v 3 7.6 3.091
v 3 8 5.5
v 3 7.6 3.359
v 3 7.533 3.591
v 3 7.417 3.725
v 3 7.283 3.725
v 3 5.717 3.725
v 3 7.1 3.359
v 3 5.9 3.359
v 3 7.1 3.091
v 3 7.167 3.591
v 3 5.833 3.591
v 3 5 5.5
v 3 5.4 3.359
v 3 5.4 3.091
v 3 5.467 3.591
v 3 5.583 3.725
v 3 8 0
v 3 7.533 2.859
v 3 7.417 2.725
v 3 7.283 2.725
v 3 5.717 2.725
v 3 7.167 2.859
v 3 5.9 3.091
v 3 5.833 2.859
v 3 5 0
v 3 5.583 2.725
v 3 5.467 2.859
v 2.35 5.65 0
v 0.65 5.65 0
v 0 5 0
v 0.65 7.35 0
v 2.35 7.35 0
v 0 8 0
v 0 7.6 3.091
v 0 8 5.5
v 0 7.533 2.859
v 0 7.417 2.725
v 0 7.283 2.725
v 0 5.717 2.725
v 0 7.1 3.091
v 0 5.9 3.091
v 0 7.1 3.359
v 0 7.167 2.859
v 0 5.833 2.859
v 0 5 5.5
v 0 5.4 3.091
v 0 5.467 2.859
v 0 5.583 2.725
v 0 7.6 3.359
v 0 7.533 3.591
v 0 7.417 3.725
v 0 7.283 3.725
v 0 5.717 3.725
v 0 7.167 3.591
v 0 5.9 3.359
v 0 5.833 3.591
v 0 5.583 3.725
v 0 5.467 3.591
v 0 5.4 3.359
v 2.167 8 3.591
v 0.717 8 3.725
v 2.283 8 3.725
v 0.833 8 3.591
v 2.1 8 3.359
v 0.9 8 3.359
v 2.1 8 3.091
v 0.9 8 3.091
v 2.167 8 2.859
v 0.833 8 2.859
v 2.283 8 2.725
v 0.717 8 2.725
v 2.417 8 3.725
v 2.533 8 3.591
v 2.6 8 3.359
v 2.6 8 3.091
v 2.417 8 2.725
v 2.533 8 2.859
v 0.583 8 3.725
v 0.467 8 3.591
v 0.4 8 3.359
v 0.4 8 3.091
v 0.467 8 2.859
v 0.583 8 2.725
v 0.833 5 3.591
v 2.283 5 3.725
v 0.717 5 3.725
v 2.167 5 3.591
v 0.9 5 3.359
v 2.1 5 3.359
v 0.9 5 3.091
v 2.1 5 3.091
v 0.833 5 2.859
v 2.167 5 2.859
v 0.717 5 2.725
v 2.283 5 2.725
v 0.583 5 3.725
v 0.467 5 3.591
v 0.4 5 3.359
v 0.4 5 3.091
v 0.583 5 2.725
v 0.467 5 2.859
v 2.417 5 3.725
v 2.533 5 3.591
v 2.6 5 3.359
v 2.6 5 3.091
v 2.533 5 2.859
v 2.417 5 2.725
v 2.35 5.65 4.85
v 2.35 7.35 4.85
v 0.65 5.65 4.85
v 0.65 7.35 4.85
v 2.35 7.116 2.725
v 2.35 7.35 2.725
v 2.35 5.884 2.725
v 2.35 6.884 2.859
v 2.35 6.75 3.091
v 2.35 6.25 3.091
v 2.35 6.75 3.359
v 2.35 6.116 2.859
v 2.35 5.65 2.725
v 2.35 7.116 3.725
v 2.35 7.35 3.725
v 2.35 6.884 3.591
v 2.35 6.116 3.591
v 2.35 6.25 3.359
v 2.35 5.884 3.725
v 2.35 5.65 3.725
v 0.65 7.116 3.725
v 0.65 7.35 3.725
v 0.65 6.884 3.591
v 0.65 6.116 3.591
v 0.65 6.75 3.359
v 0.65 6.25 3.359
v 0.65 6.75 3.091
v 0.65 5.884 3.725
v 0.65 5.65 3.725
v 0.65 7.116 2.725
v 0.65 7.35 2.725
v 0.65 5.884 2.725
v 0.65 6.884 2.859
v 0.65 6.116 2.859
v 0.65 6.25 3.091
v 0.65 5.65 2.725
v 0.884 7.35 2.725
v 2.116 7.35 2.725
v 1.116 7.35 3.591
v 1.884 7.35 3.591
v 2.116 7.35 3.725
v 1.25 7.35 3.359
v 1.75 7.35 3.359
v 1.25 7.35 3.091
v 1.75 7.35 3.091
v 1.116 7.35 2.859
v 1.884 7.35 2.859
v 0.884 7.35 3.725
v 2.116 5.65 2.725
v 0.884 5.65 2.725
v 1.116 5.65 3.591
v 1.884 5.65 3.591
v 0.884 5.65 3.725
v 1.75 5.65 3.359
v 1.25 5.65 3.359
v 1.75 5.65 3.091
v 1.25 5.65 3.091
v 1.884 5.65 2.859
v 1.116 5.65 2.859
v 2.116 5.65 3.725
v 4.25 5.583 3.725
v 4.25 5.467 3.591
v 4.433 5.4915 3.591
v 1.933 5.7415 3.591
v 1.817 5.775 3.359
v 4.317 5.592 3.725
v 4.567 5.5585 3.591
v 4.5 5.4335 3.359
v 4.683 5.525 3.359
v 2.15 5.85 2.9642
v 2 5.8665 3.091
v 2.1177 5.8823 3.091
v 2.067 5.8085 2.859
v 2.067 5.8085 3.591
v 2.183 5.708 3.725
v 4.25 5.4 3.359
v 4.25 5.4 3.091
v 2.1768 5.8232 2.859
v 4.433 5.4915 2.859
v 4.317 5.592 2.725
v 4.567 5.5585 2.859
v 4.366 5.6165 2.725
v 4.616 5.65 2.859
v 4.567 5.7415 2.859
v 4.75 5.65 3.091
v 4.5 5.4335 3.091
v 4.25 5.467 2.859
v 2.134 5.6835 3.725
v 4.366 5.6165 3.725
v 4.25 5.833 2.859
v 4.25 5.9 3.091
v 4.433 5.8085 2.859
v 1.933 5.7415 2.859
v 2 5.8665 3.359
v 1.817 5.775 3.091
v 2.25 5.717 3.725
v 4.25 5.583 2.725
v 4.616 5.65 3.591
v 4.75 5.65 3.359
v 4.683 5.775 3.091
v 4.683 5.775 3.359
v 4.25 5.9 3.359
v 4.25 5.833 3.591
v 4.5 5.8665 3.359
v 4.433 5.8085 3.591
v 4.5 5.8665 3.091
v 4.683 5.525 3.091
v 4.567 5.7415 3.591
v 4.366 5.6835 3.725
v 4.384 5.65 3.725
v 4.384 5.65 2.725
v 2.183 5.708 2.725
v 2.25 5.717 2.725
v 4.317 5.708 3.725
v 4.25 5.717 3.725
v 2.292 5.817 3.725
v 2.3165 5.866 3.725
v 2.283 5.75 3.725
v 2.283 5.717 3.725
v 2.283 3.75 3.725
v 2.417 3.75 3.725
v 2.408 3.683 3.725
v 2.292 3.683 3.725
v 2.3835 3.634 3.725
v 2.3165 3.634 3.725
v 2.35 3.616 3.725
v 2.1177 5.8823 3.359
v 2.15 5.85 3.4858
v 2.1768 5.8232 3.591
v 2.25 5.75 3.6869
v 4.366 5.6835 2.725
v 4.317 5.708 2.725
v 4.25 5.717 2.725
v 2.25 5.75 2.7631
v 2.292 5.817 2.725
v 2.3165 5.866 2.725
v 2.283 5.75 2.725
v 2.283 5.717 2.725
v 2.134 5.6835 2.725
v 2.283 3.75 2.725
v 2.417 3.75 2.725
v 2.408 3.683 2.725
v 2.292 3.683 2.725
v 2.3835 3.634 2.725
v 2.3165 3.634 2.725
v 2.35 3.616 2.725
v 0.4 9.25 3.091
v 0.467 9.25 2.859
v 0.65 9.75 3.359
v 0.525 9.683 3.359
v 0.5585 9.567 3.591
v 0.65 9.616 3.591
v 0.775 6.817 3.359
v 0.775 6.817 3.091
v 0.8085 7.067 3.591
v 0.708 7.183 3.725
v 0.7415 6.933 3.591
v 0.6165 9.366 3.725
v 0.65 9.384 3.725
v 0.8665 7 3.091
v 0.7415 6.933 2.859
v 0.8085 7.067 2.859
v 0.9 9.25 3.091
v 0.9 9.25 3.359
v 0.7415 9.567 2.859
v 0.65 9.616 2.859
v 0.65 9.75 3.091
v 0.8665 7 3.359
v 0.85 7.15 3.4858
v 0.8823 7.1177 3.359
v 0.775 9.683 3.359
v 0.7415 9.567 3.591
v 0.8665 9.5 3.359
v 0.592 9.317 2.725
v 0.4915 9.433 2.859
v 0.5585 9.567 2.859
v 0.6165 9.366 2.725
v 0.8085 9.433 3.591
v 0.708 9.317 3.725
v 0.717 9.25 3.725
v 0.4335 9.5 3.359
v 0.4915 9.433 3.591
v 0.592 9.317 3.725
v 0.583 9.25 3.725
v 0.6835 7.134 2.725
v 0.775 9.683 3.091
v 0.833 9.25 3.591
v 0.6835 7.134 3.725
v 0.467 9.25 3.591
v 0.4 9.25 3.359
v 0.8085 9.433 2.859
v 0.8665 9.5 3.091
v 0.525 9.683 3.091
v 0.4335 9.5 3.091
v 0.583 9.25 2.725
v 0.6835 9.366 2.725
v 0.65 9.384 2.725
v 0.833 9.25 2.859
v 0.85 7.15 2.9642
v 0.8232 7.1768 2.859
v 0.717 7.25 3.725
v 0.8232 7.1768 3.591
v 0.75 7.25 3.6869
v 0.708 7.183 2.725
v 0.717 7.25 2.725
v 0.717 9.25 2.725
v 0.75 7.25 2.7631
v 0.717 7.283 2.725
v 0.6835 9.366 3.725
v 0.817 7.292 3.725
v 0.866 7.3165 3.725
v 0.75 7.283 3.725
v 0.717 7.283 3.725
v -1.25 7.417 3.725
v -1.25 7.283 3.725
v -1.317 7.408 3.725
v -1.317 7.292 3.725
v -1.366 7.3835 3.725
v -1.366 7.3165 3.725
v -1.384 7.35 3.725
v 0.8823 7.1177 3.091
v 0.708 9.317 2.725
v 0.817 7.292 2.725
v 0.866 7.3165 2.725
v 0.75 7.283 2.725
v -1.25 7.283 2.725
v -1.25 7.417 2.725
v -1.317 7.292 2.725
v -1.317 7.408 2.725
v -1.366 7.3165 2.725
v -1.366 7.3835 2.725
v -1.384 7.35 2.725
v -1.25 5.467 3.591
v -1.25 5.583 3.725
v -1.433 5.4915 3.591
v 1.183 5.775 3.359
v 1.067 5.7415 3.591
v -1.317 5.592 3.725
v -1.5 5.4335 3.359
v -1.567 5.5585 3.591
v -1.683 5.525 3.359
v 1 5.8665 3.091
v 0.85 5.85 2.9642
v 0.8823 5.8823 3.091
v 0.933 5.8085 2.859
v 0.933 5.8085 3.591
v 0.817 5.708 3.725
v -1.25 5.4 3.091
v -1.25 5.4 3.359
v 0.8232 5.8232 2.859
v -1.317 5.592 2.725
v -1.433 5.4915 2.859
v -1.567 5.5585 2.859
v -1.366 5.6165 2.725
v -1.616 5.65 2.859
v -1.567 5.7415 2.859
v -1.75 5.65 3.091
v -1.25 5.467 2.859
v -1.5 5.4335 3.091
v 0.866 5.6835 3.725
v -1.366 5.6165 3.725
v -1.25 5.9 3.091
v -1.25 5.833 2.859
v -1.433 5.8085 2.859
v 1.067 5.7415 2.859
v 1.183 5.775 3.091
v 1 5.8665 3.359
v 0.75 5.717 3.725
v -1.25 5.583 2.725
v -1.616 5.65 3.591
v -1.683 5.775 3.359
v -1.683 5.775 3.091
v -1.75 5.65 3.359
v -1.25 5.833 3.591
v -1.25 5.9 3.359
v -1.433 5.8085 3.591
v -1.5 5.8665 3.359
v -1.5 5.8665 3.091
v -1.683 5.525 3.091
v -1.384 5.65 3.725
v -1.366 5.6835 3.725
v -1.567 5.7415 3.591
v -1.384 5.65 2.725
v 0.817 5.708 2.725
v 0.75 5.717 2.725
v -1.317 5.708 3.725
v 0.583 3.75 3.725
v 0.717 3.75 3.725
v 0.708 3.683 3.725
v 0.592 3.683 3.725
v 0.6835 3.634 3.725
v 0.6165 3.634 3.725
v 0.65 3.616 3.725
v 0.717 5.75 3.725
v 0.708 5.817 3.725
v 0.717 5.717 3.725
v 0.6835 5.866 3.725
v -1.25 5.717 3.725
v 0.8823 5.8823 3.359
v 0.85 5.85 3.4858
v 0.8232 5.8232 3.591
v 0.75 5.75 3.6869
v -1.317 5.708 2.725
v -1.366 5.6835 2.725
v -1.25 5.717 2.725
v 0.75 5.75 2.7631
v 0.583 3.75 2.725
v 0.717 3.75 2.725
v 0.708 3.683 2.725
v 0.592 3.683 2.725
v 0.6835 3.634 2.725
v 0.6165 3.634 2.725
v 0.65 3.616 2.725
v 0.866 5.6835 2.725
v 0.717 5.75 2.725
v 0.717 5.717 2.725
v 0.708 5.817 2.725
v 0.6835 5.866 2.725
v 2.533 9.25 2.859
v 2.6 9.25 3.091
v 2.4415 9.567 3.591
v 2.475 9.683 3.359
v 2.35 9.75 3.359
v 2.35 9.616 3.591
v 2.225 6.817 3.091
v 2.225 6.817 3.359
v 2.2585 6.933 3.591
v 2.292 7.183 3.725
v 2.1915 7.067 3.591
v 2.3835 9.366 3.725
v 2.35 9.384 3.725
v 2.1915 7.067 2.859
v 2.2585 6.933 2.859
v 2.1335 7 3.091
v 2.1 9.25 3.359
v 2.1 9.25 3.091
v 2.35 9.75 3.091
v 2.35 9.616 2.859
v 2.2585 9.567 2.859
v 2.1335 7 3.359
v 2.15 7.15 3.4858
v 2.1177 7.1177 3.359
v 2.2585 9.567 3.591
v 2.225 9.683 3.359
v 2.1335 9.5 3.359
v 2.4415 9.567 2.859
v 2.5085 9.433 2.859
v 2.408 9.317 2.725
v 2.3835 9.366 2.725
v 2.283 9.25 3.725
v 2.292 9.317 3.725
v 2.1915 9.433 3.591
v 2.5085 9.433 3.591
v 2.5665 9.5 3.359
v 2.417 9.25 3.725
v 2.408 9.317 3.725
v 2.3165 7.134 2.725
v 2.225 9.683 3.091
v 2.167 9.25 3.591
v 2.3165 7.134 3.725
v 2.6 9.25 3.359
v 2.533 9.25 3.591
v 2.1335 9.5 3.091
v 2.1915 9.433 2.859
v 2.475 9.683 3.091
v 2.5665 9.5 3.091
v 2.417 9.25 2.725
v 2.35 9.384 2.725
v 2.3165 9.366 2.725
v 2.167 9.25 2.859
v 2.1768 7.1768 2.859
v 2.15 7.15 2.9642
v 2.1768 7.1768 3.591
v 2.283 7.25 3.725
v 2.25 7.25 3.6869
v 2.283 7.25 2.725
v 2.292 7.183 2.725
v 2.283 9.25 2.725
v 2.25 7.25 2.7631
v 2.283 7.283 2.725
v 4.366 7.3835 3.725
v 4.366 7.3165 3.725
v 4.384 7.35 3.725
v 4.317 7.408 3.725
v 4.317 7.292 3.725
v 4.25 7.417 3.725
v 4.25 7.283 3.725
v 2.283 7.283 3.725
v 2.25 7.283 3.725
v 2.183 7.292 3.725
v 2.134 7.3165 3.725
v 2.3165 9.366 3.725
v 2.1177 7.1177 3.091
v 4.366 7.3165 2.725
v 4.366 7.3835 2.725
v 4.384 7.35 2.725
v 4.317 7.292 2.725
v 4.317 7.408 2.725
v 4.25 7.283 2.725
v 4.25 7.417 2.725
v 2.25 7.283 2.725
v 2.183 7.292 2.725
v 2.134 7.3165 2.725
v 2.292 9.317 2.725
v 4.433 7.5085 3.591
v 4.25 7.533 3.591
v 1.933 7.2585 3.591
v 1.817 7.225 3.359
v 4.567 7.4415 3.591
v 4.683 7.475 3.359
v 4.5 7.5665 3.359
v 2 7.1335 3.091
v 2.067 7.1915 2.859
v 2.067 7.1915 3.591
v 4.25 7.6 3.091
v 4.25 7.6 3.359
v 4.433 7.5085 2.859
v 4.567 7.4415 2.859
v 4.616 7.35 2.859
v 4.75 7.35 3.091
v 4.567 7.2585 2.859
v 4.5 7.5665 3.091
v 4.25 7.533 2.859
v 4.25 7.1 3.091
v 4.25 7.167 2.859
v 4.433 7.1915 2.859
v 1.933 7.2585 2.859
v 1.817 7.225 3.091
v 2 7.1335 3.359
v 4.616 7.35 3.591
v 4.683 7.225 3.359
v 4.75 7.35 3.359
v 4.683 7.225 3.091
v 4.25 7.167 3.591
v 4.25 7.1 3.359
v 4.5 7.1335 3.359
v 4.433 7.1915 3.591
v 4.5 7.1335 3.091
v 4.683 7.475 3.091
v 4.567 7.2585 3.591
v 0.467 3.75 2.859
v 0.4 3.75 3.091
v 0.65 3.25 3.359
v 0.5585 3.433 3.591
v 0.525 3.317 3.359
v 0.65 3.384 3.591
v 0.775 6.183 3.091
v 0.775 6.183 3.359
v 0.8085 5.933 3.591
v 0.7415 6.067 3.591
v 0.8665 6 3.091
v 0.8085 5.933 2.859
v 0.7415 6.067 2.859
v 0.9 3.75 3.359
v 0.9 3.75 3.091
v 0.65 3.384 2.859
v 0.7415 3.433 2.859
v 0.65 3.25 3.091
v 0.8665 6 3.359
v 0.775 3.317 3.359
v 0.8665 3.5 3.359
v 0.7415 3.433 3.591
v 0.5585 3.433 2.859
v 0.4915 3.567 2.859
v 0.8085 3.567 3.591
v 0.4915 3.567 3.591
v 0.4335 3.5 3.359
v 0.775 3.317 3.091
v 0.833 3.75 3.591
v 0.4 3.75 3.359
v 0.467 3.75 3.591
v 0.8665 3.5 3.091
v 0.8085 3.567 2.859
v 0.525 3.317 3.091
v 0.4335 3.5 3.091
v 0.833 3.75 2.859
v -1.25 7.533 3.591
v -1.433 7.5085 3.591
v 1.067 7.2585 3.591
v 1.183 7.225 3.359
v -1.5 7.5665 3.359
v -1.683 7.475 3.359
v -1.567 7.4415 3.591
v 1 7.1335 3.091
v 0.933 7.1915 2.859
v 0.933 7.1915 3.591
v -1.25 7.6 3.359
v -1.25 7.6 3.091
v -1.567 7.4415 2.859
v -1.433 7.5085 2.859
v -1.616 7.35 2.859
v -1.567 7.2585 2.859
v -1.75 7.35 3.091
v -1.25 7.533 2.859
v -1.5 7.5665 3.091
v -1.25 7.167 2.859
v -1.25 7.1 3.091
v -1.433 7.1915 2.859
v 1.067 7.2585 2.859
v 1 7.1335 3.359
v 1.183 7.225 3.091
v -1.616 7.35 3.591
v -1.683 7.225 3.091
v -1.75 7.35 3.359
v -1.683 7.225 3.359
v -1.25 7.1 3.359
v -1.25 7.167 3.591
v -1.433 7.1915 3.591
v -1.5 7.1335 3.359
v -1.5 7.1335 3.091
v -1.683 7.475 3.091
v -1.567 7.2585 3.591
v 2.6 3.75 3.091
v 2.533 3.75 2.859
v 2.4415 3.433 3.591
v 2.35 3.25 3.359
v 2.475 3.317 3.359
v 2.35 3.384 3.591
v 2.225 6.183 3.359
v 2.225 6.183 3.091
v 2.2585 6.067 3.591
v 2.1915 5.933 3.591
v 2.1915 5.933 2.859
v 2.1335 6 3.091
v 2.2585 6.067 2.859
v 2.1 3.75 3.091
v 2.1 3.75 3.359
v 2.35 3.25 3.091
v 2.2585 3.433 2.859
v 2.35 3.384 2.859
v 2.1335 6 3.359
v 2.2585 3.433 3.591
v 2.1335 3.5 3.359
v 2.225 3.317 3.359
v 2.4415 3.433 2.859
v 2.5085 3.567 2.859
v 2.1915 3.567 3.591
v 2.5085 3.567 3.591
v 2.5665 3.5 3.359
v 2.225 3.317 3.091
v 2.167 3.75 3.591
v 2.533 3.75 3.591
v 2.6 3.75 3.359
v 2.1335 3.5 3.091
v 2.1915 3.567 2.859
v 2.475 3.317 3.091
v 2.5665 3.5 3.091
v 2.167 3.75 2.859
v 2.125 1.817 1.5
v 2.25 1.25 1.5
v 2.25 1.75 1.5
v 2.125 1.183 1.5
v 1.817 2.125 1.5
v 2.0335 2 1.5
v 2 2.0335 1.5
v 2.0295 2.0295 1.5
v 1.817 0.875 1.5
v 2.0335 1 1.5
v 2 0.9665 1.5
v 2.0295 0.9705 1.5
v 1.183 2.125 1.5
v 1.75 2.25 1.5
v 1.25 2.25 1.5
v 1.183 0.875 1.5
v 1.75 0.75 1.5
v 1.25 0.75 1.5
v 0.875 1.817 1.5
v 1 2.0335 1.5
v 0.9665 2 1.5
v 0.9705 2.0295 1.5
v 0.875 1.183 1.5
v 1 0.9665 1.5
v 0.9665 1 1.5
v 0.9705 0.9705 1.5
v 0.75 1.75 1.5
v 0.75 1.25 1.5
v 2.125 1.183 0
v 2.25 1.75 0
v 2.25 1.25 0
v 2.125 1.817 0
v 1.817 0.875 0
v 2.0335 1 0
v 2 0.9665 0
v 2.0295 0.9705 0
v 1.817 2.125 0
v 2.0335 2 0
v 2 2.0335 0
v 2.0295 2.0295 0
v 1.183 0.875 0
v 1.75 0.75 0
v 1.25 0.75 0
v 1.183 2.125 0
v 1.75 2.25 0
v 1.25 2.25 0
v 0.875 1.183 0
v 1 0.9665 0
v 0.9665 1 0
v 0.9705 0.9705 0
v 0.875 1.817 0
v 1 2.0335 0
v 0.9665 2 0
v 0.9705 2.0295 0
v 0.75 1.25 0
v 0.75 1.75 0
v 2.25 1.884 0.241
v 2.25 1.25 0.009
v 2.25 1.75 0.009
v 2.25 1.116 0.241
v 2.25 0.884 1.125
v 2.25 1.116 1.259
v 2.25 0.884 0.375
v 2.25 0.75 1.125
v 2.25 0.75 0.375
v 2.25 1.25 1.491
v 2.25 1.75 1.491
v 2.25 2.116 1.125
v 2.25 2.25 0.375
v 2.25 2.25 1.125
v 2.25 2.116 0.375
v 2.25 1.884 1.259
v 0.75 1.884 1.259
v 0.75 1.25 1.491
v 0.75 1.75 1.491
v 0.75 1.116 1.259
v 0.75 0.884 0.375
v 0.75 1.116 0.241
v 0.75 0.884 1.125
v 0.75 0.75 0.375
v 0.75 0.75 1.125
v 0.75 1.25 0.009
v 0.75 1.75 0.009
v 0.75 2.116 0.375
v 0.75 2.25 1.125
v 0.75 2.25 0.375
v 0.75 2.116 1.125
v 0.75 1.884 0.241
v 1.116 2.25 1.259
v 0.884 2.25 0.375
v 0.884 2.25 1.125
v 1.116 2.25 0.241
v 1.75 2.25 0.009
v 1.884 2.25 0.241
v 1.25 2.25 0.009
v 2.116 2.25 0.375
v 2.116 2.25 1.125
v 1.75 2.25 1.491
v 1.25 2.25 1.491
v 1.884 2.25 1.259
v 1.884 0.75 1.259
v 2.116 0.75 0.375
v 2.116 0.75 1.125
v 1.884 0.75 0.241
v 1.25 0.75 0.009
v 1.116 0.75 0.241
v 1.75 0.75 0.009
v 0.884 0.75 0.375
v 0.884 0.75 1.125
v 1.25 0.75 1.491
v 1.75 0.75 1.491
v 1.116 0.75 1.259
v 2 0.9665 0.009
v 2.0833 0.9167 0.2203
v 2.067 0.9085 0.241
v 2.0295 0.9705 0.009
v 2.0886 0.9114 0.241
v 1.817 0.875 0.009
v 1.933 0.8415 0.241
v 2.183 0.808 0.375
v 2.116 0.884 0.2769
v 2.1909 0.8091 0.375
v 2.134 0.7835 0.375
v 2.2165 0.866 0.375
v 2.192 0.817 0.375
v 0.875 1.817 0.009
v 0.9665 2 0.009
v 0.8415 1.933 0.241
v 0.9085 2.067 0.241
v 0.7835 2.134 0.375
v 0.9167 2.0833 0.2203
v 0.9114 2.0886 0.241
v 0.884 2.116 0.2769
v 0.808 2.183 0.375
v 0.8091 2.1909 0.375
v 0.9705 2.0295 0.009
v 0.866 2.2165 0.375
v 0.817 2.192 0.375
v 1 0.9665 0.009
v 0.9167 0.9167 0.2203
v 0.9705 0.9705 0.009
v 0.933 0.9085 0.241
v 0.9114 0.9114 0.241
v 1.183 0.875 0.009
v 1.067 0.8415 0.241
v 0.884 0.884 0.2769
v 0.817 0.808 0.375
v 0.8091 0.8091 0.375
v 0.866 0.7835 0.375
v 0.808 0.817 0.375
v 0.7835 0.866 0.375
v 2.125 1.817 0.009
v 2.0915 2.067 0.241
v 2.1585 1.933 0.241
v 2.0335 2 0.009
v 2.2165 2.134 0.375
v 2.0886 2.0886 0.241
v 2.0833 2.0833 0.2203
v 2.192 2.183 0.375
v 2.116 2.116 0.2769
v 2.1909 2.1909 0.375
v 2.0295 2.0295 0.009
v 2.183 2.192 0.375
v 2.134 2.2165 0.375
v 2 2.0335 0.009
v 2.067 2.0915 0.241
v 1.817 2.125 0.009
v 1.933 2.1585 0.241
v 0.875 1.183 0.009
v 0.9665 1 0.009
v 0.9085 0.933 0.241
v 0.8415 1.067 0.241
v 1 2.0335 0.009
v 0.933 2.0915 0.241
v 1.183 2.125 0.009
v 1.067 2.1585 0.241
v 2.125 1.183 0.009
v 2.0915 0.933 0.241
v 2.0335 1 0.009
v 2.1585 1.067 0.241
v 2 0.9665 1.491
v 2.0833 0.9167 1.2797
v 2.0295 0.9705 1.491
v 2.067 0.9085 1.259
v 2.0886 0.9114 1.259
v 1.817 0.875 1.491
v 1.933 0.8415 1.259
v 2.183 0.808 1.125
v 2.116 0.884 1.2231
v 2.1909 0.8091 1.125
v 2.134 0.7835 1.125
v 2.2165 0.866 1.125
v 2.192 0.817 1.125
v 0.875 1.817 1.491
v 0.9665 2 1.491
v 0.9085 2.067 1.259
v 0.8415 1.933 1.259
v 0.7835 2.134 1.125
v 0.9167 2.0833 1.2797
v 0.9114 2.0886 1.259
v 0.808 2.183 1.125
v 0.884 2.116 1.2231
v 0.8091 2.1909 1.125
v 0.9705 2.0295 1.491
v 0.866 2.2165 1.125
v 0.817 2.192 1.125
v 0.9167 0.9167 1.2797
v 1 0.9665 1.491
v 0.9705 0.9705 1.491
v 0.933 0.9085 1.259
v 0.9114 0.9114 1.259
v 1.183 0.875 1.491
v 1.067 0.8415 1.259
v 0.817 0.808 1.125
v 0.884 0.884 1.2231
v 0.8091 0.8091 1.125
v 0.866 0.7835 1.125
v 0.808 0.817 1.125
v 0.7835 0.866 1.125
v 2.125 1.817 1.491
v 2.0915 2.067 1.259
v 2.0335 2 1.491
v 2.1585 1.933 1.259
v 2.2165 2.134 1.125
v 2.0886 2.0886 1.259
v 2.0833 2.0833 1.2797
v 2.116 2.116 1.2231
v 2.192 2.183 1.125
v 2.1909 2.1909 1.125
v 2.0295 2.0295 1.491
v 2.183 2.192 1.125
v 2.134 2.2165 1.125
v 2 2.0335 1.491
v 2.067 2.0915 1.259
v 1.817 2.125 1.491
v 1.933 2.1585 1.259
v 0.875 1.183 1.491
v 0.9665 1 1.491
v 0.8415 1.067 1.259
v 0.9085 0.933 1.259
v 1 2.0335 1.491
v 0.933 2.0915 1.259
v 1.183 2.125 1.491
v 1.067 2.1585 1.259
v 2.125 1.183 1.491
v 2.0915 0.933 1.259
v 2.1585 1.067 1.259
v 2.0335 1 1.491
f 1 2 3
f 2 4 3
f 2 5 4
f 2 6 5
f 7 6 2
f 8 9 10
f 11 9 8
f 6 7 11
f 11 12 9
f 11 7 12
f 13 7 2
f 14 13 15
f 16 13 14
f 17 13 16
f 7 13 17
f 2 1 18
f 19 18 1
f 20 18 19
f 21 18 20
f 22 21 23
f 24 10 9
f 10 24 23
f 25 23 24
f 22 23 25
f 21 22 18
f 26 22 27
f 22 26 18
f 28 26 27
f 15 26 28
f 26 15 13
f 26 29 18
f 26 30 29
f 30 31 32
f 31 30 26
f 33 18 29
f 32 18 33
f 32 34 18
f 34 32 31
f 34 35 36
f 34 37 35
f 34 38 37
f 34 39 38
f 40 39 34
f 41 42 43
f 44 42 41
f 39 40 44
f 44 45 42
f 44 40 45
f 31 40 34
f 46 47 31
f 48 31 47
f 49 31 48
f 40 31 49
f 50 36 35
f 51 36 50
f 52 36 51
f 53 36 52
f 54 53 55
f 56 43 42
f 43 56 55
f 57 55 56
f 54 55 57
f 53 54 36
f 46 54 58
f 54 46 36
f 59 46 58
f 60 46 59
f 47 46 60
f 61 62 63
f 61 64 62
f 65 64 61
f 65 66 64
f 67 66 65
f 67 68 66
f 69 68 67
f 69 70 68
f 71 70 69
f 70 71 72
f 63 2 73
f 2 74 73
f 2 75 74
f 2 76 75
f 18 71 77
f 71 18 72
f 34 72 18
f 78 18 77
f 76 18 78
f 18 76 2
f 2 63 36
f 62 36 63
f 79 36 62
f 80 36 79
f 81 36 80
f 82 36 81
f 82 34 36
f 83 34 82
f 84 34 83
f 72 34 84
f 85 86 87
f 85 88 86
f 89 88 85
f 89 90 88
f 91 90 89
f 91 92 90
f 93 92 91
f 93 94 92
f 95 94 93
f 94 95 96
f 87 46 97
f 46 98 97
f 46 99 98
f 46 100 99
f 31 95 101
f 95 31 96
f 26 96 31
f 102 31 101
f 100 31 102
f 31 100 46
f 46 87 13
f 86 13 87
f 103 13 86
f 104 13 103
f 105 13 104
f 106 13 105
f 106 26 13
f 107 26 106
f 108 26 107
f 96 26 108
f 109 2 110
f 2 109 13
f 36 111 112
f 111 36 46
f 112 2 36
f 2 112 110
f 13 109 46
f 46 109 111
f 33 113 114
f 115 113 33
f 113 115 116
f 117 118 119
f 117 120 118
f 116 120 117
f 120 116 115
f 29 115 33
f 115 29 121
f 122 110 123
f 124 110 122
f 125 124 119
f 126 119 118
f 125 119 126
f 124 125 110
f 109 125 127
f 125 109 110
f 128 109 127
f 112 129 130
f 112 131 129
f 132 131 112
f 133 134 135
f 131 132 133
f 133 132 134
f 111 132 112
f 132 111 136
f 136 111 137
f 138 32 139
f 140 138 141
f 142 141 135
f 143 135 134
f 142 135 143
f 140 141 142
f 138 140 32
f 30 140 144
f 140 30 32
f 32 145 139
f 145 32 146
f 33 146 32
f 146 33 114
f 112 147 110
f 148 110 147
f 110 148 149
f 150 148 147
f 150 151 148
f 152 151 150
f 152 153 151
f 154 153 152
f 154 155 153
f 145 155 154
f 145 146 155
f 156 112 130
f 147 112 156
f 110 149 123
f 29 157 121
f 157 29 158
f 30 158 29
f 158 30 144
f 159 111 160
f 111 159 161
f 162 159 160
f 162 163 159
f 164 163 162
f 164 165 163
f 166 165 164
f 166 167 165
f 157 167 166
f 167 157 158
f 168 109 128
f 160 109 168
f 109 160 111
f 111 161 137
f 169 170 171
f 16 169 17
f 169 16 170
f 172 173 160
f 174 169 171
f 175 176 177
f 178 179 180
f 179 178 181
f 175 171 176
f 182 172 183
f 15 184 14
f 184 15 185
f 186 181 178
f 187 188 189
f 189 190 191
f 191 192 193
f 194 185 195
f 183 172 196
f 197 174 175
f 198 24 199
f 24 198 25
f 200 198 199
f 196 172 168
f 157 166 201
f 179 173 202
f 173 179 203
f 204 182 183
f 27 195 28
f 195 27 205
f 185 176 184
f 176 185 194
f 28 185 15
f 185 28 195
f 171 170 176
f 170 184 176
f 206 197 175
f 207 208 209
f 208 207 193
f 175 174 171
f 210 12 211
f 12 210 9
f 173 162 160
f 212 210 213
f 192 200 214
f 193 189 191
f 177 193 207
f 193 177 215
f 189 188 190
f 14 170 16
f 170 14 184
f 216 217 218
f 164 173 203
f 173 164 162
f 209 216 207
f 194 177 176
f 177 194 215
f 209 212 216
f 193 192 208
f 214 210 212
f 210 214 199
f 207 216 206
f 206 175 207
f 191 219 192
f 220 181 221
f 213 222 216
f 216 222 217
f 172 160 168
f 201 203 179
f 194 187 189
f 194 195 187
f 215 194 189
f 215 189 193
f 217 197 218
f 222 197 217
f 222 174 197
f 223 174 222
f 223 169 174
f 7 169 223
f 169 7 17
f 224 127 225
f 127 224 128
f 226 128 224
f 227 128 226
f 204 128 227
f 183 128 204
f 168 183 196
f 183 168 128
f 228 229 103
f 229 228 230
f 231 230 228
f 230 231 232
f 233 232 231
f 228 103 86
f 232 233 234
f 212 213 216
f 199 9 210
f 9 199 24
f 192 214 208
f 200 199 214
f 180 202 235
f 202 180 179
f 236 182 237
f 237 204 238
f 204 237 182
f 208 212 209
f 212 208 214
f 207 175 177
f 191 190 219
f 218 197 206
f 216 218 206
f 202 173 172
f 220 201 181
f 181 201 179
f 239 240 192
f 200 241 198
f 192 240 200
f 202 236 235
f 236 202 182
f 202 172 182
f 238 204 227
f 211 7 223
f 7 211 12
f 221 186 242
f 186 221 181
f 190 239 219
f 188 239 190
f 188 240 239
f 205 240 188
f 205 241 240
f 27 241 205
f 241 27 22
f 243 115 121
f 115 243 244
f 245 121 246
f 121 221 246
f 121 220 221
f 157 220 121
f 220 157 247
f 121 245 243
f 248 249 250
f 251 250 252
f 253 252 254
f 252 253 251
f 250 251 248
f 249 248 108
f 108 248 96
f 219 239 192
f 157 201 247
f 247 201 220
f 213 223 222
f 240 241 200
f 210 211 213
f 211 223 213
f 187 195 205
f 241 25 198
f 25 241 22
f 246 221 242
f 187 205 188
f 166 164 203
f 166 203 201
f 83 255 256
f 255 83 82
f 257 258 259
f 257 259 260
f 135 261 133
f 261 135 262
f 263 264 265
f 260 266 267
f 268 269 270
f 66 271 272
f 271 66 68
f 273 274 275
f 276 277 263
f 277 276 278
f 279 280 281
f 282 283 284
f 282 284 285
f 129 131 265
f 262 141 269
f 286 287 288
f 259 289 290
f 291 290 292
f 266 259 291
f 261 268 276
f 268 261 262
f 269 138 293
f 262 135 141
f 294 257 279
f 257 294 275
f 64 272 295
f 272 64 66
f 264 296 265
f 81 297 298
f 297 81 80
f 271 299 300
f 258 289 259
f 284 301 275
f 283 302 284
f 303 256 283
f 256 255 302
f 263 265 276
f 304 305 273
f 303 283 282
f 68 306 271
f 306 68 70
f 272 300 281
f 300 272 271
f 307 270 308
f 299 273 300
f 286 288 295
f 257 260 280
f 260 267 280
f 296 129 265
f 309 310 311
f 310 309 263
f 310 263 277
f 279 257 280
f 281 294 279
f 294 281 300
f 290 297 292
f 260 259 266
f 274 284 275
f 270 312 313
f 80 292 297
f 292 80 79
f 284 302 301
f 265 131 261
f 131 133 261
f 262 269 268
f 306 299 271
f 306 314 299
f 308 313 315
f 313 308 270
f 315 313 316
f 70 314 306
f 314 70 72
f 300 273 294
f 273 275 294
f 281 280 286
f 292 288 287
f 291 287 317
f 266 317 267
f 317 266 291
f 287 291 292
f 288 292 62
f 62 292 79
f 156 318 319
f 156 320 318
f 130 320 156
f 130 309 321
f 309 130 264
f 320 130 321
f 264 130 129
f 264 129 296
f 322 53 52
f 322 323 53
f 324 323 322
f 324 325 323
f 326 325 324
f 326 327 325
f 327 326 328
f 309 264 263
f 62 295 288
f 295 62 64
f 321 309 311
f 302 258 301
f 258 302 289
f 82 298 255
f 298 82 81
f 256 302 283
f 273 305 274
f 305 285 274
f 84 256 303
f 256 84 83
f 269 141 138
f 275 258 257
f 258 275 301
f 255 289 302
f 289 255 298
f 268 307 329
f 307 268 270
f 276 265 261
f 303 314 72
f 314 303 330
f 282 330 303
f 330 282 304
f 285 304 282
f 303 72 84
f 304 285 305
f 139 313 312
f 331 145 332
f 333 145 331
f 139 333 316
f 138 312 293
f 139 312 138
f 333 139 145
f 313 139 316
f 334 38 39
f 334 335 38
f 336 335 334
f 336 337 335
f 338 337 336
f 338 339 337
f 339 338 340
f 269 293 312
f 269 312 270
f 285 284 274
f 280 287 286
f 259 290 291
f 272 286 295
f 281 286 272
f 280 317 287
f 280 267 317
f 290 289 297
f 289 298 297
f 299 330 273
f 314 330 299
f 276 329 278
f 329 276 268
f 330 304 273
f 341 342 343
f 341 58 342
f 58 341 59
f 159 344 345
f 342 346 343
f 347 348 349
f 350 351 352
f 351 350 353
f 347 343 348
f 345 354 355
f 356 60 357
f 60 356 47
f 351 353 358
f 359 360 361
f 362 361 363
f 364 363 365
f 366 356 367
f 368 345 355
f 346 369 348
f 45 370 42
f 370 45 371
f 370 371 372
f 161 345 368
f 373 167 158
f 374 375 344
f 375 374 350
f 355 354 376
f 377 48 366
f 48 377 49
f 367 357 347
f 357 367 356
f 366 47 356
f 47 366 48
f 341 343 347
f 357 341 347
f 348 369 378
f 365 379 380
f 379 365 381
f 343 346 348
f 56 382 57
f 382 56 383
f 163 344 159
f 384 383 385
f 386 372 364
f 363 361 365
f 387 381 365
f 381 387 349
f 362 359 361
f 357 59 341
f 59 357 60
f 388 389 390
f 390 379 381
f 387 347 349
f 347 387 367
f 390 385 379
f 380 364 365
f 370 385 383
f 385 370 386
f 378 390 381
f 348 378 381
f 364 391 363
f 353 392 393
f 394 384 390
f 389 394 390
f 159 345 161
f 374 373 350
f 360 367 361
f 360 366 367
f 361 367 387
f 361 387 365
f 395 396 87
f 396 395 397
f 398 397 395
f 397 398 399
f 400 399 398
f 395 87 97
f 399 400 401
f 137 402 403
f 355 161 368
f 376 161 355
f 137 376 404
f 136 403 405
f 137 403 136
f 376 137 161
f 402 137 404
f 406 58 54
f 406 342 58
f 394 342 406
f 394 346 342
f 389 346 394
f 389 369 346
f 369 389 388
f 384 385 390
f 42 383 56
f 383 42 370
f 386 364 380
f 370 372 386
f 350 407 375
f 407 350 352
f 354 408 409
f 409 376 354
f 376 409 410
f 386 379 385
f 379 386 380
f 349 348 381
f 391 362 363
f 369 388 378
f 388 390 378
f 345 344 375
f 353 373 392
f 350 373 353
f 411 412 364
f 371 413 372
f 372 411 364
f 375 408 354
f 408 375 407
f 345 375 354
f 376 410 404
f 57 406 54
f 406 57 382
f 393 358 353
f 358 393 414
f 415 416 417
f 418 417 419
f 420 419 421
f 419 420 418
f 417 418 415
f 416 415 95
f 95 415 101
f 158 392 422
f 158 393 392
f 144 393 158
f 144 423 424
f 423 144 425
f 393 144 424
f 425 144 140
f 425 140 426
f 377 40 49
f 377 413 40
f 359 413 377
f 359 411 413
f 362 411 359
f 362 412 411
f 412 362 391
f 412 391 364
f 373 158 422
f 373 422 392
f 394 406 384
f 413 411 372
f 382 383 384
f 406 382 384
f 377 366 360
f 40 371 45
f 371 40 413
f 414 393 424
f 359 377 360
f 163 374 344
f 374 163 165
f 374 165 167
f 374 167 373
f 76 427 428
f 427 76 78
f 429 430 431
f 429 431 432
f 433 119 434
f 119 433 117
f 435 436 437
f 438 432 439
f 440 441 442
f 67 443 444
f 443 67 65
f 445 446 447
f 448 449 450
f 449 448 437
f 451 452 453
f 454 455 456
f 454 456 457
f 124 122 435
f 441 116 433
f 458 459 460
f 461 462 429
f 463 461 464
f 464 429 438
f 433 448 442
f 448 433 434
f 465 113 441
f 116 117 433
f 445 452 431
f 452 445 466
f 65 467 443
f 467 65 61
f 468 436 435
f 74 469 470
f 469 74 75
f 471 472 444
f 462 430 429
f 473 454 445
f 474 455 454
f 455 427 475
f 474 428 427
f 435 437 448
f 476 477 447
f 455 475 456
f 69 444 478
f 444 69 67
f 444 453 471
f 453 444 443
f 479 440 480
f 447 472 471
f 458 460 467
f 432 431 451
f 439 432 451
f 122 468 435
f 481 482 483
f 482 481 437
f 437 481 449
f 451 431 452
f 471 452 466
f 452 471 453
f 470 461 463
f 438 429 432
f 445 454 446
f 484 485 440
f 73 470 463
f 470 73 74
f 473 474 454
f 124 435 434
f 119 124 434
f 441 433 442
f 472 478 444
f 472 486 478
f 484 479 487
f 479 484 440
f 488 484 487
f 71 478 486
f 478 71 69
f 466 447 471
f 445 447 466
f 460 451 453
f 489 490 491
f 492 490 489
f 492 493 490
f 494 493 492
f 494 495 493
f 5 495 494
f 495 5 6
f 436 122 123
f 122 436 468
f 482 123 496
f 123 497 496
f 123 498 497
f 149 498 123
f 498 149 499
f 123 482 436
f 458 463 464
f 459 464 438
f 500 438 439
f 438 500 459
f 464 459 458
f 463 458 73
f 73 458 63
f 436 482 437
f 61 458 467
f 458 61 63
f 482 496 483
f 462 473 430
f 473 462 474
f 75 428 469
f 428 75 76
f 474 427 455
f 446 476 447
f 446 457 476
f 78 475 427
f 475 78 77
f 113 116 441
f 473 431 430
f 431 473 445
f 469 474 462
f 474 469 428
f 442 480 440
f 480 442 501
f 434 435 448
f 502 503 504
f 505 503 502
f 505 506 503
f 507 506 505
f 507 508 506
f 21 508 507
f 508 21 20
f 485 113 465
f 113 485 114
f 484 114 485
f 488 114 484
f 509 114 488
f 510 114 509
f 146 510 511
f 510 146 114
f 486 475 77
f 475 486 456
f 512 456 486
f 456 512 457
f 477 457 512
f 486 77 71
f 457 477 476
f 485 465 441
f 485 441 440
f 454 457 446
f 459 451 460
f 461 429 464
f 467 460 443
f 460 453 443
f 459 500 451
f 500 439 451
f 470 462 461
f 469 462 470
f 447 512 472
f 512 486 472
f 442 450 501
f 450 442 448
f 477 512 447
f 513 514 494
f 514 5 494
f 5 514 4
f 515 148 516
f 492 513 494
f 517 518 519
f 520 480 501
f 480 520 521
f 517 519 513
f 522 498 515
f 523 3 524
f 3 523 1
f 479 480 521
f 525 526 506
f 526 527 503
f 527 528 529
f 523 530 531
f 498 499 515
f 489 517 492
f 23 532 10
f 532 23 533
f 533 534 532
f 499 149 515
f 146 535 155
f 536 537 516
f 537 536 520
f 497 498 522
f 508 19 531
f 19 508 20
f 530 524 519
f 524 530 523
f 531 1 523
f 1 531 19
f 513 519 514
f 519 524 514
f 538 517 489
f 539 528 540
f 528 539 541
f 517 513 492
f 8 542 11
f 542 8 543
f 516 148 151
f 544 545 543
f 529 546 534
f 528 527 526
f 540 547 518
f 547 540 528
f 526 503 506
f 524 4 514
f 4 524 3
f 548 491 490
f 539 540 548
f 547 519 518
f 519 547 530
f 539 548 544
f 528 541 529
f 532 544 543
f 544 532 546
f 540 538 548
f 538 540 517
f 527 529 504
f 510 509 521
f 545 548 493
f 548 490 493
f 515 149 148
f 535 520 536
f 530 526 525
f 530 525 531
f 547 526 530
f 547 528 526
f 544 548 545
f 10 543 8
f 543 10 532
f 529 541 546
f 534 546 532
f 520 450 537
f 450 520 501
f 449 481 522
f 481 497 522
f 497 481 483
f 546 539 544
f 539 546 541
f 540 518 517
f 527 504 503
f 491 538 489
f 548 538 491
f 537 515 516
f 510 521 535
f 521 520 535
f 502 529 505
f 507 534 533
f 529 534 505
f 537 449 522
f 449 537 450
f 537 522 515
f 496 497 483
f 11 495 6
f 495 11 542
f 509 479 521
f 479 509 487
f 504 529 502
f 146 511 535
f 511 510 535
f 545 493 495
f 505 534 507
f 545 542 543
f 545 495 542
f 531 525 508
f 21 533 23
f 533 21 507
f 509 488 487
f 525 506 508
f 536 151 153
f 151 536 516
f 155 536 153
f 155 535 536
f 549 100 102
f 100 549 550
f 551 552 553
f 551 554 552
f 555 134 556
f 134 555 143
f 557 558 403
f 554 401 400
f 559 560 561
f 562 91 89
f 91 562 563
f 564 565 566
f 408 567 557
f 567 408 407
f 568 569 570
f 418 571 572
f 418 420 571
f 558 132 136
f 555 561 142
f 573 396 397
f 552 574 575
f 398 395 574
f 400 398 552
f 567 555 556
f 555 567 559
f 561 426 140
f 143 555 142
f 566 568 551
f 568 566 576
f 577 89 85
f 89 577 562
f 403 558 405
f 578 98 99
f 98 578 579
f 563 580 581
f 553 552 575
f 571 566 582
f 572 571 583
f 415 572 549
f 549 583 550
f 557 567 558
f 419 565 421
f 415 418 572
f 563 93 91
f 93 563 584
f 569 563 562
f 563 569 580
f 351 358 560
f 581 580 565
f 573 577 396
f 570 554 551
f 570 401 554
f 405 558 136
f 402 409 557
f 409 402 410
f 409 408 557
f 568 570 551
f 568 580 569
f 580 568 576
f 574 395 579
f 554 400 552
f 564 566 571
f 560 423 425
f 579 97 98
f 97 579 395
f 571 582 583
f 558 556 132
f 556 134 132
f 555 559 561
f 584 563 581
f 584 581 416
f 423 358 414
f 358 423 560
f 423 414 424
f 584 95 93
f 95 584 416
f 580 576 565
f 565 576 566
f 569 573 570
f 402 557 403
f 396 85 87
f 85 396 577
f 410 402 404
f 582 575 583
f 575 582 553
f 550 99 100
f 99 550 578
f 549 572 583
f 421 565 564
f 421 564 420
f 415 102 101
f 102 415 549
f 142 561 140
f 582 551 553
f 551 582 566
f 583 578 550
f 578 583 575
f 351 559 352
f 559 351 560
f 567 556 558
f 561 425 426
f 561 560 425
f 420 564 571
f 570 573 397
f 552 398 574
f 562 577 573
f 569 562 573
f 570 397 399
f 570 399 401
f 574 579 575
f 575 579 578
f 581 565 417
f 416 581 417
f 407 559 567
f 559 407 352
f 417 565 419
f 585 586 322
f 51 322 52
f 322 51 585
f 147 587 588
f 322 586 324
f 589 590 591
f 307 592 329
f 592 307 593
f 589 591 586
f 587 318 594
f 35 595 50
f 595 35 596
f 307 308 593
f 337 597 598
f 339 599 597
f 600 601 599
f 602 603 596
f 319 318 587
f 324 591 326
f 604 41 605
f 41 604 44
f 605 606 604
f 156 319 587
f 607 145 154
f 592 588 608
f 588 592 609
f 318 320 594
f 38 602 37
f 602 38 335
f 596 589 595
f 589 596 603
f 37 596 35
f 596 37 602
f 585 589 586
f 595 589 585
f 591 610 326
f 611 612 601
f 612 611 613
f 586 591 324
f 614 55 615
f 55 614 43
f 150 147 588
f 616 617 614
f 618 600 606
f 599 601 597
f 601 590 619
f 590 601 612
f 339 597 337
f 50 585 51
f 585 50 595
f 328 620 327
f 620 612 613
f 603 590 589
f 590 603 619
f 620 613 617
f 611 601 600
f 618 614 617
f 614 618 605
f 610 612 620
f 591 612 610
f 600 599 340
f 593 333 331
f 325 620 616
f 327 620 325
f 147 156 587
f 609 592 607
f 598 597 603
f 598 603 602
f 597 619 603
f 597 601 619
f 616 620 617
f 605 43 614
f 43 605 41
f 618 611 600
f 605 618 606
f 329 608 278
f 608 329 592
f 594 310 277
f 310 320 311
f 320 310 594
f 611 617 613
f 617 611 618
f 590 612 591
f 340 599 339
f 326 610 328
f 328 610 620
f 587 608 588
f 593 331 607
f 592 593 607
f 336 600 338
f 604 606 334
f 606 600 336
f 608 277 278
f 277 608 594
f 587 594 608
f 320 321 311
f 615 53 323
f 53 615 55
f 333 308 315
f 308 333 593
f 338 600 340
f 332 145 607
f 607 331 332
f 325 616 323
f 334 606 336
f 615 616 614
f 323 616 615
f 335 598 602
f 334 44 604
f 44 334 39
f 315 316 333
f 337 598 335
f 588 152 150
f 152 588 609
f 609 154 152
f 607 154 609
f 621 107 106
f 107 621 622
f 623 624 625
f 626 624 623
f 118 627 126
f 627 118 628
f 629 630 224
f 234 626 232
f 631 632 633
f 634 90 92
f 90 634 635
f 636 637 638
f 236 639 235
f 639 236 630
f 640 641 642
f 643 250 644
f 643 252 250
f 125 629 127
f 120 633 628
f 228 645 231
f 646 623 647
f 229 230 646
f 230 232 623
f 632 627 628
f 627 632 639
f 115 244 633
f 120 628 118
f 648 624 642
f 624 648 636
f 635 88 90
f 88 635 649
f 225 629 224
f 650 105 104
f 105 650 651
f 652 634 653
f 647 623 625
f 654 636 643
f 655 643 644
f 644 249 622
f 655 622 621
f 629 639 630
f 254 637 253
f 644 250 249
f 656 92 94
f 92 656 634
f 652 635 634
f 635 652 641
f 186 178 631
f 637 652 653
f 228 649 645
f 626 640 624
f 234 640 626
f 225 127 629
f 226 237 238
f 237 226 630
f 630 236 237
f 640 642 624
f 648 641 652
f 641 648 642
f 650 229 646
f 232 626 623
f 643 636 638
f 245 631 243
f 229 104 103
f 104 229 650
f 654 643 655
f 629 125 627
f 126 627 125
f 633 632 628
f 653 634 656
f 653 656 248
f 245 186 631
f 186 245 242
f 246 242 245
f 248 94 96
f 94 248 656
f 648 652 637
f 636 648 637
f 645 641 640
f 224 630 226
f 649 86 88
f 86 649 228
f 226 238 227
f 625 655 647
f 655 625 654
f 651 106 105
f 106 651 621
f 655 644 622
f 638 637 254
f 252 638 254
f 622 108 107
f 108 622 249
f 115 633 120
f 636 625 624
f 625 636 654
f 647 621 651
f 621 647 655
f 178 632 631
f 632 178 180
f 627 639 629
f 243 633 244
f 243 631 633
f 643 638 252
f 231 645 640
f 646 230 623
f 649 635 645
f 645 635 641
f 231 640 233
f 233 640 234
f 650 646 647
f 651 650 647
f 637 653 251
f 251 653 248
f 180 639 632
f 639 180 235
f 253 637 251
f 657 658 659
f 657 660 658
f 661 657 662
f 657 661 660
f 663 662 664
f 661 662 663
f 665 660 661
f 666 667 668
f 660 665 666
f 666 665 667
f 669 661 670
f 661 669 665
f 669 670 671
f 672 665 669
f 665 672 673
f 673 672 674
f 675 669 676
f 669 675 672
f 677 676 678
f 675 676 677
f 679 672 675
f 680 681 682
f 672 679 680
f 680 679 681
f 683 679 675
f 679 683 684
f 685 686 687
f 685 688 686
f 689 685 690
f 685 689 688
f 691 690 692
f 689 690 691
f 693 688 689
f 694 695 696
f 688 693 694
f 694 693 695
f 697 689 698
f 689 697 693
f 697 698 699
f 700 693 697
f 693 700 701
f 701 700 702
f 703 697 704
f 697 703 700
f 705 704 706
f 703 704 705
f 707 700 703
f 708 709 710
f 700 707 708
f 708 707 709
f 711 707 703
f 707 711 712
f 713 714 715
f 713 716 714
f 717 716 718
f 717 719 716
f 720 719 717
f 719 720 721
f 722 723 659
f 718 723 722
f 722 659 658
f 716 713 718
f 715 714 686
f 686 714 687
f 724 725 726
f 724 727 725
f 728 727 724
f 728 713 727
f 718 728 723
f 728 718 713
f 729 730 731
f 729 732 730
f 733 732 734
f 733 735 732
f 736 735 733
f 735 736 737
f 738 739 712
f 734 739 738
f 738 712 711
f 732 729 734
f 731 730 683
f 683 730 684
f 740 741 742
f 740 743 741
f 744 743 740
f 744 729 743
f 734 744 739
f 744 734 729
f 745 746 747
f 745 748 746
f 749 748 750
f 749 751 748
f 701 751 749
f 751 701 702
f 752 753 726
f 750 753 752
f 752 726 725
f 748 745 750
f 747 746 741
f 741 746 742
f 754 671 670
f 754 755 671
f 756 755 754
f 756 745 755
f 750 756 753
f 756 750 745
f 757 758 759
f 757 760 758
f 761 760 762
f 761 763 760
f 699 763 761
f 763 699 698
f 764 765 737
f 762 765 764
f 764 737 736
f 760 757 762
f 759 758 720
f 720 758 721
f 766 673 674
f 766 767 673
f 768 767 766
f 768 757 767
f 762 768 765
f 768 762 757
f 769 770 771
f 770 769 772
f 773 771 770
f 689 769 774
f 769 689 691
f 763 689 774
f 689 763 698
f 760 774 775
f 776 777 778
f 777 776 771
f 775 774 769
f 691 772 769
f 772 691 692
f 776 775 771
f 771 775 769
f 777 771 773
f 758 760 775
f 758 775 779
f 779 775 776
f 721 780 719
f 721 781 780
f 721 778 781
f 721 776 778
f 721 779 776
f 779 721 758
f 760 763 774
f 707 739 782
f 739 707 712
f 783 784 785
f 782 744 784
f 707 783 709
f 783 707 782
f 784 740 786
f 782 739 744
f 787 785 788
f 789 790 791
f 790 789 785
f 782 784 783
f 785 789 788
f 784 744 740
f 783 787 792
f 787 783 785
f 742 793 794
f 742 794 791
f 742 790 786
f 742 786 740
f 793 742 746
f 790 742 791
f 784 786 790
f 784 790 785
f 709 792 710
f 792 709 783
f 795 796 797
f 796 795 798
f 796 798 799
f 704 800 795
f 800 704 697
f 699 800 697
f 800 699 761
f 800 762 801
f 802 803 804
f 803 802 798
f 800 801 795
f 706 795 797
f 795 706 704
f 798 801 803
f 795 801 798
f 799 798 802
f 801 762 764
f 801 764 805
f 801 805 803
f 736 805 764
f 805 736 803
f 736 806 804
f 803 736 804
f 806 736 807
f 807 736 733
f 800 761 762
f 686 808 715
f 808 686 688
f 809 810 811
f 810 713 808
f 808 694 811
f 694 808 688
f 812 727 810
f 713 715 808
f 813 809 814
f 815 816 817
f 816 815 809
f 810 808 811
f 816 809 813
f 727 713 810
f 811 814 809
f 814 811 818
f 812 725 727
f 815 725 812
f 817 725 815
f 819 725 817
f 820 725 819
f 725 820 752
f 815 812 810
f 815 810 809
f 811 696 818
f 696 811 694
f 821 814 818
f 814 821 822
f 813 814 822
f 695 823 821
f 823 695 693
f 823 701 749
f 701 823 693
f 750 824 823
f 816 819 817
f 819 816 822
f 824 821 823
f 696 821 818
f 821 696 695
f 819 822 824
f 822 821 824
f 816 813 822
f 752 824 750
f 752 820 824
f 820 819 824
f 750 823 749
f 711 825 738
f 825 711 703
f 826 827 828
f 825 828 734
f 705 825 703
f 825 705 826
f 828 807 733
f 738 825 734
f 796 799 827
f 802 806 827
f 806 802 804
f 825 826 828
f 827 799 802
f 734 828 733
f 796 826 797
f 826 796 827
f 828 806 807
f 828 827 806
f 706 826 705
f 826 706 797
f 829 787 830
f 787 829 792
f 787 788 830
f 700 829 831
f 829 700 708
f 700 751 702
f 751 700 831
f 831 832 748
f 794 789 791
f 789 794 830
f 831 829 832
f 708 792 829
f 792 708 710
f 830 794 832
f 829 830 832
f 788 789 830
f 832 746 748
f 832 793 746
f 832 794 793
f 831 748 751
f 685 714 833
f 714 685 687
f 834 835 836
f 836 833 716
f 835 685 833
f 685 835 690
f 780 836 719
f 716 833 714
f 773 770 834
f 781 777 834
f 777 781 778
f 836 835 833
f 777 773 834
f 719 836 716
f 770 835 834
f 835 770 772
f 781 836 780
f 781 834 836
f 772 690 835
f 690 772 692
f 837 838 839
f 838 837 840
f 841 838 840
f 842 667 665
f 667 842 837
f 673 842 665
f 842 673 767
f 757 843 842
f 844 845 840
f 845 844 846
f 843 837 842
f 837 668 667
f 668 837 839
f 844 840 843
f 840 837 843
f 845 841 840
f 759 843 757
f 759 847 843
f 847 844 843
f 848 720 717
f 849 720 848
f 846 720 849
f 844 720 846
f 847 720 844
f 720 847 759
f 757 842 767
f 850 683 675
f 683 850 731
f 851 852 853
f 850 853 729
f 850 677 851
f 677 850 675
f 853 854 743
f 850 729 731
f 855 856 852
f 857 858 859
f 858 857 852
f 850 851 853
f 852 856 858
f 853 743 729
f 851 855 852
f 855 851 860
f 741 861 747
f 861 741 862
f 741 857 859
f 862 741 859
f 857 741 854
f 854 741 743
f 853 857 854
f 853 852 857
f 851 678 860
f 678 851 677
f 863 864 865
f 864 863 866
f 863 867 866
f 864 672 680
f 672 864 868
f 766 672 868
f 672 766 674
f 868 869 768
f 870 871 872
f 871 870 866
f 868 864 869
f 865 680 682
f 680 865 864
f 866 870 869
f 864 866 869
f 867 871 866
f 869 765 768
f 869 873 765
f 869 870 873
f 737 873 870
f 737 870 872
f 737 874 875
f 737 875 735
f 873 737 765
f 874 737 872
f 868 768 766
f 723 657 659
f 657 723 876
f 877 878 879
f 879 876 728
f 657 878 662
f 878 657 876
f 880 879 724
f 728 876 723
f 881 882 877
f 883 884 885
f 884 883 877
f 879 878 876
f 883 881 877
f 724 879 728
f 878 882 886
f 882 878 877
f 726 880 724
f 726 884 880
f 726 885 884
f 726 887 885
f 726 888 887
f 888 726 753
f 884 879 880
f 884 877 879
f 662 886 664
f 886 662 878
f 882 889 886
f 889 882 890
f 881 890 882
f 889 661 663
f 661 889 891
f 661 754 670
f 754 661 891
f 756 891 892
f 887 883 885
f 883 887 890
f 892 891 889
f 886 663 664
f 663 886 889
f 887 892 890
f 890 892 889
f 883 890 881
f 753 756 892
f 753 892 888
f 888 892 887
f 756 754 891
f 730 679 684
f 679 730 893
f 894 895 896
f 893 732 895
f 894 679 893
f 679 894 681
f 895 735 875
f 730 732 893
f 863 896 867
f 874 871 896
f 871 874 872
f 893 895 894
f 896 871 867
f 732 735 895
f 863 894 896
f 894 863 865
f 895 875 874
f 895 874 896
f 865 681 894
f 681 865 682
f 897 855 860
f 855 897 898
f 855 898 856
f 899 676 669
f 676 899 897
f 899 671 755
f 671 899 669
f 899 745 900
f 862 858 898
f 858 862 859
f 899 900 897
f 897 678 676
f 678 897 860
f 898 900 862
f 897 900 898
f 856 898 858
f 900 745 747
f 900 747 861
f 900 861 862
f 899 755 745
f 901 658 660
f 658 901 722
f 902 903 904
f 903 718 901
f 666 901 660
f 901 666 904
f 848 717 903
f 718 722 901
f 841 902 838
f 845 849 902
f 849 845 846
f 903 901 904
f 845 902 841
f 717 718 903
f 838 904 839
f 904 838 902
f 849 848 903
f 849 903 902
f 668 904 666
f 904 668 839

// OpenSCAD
// BGSD
include <../lib/boardgame_insert_toolkit_lib.4.scad>;
data = [
    // Source STL: Tiles.stl
    // STL bbox min [-191, -62.5, 0] max [-113, 101, 69] size [78, 163.5, 69]
    // Detected compartments: 2; wall thickness: 1.5mm
    [ OBJECT_BOX,
        [ NAME, "Tiles" ],
        [ BOX_SIZE_XYZ, [78, 163.5, 69] ],
        [ BOX_WALL_THICKNESS, 1.5 ],
        [ BOX_NO_LID_B, true ],
        [ BOX_FEATURE,
            [ NAME, "Tiles cavity 1" ],
            [ FTR_COMPARTMENT_SIZE_XYZ, [75, 84, 67.5] ],
            [ FTR_NUM_COMPARTMENTS_XY, [1, 1] ],
            [ FTR_SHAPE, SQUARE ],
            [ POSITION_XY, [0, 0] ],
        ],
        [ BOX_FEATURE,
            [ NAME, "Tiles cavity 2" ],
            [ FTR_COMPARTMENT_SIZE_XYZ, [75, 75, 67.5] ],
            [ FTR_NUM_COMPARTMENTS_XY, [1, 1] ],
            [ FTR_SHAPE, SQUARE ],
            [ POSITION_XY, [0, 85.5] ],
        ],
    ],
];
Make(data);
